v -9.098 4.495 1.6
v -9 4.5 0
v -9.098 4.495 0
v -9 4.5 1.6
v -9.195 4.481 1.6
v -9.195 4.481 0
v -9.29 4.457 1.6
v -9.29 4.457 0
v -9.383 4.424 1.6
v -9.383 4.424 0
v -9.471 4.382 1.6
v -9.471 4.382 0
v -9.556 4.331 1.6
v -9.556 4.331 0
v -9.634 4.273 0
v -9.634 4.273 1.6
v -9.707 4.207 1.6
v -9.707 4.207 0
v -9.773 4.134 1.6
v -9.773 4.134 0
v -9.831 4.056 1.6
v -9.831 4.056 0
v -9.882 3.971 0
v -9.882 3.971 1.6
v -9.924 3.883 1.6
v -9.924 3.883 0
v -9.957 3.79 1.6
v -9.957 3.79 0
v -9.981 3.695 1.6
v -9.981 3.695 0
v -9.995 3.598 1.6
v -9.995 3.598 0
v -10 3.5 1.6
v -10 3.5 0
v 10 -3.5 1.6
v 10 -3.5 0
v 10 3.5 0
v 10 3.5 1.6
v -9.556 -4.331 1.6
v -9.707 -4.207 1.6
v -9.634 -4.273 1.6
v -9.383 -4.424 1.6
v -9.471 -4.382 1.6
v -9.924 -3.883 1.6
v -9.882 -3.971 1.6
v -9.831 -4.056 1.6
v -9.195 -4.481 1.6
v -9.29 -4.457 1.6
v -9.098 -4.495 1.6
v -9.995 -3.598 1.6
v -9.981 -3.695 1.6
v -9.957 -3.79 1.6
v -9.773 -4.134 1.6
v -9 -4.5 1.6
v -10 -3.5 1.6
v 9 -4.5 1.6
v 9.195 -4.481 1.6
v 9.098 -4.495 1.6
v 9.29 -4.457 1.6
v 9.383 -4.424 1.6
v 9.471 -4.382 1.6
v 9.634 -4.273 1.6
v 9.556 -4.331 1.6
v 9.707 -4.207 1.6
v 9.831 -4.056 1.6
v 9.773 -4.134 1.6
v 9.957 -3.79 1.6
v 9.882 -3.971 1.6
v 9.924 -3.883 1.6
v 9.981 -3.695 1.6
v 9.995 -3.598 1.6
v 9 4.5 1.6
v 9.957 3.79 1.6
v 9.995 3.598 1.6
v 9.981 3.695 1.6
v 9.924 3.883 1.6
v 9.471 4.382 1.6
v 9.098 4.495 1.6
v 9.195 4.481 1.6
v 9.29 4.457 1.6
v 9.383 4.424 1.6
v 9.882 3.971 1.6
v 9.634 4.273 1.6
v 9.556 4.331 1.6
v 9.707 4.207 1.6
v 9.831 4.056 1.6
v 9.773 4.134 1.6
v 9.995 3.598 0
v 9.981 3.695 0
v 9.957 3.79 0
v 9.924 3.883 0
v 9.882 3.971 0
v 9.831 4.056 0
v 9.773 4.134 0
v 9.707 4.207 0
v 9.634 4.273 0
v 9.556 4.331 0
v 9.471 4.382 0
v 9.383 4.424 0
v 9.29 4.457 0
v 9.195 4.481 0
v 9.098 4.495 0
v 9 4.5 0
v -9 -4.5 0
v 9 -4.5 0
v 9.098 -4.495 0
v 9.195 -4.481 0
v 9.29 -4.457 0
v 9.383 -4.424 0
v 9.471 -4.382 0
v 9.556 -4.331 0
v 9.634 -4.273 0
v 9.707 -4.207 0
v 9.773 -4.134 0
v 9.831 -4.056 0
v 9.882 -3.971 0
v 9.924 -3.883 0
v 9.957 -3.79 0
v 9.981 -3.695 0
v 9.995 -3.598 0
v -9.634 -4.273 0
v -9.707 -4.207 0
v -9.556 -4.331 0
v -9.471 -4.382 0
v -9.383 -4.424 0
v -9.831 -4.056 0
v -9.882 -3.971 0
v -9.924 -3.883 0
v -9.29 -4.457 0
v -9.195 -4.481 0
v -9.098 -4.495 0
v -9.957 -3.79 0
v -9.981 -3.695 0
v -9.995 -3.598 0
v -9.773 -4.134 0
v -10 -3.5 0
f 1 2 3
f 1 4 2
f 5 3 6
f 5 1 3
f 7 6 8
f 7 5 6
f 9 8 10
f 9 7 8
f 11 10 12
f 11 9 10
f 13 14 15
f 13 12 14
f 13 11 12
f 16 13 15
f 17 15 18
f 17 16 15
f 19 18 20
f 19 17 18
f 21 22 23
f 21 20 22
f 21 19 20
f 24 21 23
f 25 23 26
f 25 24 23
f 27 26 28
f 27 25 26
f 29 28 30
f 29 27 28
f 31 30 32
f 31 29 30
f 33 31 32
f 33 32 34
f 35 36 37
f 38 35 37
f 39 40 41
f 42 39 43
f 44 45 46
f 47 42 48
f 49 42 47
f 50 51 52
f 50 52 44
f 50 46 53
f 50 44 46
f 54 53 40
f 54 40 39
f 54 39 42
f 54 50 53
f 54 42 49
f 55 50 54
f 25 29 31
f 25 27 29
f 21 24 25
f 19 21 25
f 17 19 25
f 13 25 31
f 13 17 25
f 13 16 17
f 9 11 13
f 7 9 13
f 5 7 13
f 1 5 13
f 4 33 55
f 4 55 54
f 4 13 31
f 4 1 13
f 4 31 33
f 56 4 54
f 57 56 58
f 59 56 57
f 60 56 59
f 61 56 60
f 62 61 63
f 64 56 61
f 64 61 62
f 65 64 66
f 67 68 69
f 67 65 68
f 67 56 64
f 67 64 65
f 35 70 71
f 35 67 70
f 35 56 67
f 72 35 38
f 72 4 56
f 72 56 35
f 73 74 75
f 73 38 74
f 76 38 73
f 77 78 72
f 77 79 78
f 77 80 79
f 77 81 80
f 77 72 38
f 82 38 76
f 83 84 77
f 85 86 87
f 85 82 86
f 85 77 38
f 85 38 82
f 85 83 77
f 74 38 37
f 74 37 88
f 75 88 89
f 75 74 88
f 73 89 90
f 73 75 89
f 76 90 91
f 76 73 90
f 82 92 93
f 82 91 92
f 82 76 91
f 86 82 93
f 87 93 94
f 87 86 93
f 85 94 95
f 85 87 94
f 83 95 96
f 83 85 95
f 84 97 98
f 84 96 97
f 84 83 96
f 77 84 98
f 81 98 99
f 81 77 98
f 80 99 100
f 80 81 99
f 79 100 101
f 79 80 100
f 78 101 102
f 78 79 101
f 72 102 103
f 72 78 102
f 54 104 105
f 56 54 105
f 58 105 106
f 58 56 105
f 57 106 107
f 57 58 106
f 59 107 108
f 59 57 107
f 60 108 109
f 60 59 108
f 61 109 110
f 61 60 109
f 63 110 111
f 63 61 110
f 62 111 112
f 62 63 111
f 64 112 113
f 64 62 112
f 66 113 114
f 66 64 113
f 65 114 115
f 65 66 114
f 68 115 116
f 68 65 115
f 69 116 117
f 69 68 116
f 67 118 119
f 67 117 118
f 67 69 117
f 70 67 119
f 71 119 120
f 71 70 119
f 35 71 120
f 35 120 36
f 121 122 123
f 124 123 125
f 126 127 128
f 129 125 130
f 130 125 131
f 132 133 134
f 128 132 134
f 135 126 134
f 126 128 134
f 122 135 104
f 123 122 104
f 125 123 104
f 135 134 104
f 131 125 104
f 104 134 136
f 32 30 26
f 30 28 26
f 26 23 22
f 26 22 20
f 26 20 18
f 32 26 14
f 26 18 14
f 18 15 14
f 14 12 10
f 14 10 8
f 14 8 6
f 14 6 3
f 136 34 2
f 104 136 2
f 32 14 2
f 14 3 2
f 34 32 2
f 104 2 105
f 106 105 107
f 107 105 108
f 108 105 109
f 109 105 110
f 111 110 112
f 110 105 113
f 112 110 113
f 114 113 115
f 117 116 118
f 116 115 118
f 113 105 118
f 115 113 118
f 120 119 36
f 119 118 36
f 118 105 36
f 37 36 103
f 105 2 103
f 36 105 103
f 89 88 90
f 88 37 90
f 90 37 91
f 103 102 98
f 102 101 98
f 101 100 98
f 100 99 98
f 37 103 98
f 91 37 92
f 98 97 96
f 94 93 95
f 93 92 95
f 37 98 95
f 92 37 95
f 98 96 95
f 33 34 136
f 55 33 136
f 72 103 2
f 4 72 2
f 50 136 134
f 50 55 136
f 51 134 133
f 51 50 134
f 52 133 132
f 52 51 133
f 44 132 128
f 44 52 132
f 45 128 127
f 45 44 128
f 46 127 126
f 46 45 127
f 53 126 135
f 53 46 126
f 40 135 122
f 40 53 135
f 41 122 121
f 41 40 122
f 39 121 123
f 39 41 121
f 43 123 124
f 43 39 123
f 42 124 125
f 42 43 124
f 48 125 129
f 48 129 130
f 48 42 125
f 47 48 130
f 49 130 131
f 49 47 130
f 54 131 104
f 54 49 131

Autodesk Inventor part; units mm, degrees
ref_plane "YZ Plane" through (0, 0, 0) normal (1, 0, 0) x (0, 1, 0)
ref_plane "XZ Plane" through (0, 0, 0) normal (0, 1, 0) x (-1, 0, 0)
ref_plane "XY Plane" through (0, 0, 0) normal (0, 0, 1) x (1, 0, 0)
sketch "Sketch1" plane through (0, 0, 0) normal (0, 0, 1) x (1, 0, 0)
  line L0 (-10, -4.5) -> (10, -4.5)
  line L1 (10, -4.5) -> (10, 4.5)
  line L2 (10, 4.5) -> (-10, 4.5)
  line L3 (-10, 4.5) -> (-10, -4.5)
  line L4 (-10, -4.5) -> (10, 4.5) construction
  line L5 (10, -4.5) -> (-10, 4.5) construction
  point P0 (0, 0)
  dimension "d0" = 20
  dimension "d1" = 9
extrude "Extrusion1" add sketch "Sketch1" along normal blind 1.6
fillet "Fillet1" radius 1 4 edges at (10, 4.5, 0.8) (-10, 4.5, 0.8) (-10, -4.5, 0.8) (10, -4.5, 0.8)
sketch "MiniUSB_ADAPTER_PCB_OUTLINE" plane through (0, 0, 1.6) normal (0, 0, 1) x (1, 0, 0)
  line L0 (3.8, 0.85) -> (3.8, 2.35) projected
  line L1 (3.5, 2.35) -> (3.5, 0.85) projected
  line L2 (3.5, 0.85) -> (3.8, 0.85) projected
  line L3 (3.8, 2.35) -> (3.5, 2.35) projected
  line L4 (-3.5, 2.35) -> (-3.5, 0.85) projected
  line L5 (-3.8, 0.85) -> (-3.8, 2.35) projected
  line L6 (-3.5, 0.85) -> (-3.8, 0.85) projected
  line L7 (-3.8, 2.35) -> (-3.5, 2.35) projected
  line L8 (-1.8, 0.175) -> (-1.4, 0.175) projected
  line L9 (-1.4, 0.175) -> (-1.4, 0.425) projected
  line L10 (-1.4, 0.425) -> (-1.8, 0.425) projected
  line L11 (-1.8, 0.425) -> (-1.8, 0.175) projected
  line L12 (0.6, 2.775) -> (1, 2.775) projected
  line L13 (1, 3.025) -> (0.6, 3.025) projected
  line L14 (0.6, 3.025) -> (0.6, 2.775) projected
  line L15 (1, 2.775) -> (1, 3.025) projected
  line L16 (1.875, -1.1641) -> (-1.875, -1.1641) projected
  line L17 (1.4, 0.175) -> (1.8, 0.175) projected
  line L18 (1.8, 0.425) -> (1.4, 0.425) projected
  line L19 (1.4, 0.425) -> (1.4, 0.175) projected
  line L20 (1.8, 0.175) -> (1.8, 0.425) projected
  line L21 (-1, 2.775) -> (-0.6, 2.775) projected
  line L22 (-1, 3.025) -> (-1, 2.775) projected
  line L23 (-0.6, 3.025) -> (-1, 3.025) projected
  line L24 (-0.6, 2.775) -> (-0.6, 3.025) projected
  line L25 (0.2, 0.425) -> (-0.2, 0.425) projected
  line L26 (0.2, 0.175) -> (0.2, 0.425) projected
  line L27 (-0.2, 0.175) -> (0.2, 0.175) projected
  line L28 (-0.2, 0.425) -> (-0.2, 0.175) projected
  circle A0 centre (-3.65, 1.6) radius 0.75
  circle A1 centre (3.65, 1.6) radius 0.75
  arc A2 (9, -4.5) -> (10, -3.5) centre (9, -3.5) ccw projected
  line L29 (10, -3.5) -> (10, 3.5) projected
  arc A3 (10, 3.5) -> (9, 4.5) centre (9, 3.5) ccw projected
  line L30 (9, 4.5) -> (-9, 4.5) projected
  arc A4 (-9, 4.5) -> (-10, 3.5) centre (-9, 3.5) ccw projected
  line L31 (-10, 3.5) -> (-10, -3.5) projected
  arc A5 (-10, -3.5) -> (-9, -4.5) centre (-9, -3.5) ccw projected
  line L32 (-9, -4.5) -> (9, -4.5) projected
  point P0 (0, 0)
properties part number "MiniUSB_ADAPTER_PCB"
